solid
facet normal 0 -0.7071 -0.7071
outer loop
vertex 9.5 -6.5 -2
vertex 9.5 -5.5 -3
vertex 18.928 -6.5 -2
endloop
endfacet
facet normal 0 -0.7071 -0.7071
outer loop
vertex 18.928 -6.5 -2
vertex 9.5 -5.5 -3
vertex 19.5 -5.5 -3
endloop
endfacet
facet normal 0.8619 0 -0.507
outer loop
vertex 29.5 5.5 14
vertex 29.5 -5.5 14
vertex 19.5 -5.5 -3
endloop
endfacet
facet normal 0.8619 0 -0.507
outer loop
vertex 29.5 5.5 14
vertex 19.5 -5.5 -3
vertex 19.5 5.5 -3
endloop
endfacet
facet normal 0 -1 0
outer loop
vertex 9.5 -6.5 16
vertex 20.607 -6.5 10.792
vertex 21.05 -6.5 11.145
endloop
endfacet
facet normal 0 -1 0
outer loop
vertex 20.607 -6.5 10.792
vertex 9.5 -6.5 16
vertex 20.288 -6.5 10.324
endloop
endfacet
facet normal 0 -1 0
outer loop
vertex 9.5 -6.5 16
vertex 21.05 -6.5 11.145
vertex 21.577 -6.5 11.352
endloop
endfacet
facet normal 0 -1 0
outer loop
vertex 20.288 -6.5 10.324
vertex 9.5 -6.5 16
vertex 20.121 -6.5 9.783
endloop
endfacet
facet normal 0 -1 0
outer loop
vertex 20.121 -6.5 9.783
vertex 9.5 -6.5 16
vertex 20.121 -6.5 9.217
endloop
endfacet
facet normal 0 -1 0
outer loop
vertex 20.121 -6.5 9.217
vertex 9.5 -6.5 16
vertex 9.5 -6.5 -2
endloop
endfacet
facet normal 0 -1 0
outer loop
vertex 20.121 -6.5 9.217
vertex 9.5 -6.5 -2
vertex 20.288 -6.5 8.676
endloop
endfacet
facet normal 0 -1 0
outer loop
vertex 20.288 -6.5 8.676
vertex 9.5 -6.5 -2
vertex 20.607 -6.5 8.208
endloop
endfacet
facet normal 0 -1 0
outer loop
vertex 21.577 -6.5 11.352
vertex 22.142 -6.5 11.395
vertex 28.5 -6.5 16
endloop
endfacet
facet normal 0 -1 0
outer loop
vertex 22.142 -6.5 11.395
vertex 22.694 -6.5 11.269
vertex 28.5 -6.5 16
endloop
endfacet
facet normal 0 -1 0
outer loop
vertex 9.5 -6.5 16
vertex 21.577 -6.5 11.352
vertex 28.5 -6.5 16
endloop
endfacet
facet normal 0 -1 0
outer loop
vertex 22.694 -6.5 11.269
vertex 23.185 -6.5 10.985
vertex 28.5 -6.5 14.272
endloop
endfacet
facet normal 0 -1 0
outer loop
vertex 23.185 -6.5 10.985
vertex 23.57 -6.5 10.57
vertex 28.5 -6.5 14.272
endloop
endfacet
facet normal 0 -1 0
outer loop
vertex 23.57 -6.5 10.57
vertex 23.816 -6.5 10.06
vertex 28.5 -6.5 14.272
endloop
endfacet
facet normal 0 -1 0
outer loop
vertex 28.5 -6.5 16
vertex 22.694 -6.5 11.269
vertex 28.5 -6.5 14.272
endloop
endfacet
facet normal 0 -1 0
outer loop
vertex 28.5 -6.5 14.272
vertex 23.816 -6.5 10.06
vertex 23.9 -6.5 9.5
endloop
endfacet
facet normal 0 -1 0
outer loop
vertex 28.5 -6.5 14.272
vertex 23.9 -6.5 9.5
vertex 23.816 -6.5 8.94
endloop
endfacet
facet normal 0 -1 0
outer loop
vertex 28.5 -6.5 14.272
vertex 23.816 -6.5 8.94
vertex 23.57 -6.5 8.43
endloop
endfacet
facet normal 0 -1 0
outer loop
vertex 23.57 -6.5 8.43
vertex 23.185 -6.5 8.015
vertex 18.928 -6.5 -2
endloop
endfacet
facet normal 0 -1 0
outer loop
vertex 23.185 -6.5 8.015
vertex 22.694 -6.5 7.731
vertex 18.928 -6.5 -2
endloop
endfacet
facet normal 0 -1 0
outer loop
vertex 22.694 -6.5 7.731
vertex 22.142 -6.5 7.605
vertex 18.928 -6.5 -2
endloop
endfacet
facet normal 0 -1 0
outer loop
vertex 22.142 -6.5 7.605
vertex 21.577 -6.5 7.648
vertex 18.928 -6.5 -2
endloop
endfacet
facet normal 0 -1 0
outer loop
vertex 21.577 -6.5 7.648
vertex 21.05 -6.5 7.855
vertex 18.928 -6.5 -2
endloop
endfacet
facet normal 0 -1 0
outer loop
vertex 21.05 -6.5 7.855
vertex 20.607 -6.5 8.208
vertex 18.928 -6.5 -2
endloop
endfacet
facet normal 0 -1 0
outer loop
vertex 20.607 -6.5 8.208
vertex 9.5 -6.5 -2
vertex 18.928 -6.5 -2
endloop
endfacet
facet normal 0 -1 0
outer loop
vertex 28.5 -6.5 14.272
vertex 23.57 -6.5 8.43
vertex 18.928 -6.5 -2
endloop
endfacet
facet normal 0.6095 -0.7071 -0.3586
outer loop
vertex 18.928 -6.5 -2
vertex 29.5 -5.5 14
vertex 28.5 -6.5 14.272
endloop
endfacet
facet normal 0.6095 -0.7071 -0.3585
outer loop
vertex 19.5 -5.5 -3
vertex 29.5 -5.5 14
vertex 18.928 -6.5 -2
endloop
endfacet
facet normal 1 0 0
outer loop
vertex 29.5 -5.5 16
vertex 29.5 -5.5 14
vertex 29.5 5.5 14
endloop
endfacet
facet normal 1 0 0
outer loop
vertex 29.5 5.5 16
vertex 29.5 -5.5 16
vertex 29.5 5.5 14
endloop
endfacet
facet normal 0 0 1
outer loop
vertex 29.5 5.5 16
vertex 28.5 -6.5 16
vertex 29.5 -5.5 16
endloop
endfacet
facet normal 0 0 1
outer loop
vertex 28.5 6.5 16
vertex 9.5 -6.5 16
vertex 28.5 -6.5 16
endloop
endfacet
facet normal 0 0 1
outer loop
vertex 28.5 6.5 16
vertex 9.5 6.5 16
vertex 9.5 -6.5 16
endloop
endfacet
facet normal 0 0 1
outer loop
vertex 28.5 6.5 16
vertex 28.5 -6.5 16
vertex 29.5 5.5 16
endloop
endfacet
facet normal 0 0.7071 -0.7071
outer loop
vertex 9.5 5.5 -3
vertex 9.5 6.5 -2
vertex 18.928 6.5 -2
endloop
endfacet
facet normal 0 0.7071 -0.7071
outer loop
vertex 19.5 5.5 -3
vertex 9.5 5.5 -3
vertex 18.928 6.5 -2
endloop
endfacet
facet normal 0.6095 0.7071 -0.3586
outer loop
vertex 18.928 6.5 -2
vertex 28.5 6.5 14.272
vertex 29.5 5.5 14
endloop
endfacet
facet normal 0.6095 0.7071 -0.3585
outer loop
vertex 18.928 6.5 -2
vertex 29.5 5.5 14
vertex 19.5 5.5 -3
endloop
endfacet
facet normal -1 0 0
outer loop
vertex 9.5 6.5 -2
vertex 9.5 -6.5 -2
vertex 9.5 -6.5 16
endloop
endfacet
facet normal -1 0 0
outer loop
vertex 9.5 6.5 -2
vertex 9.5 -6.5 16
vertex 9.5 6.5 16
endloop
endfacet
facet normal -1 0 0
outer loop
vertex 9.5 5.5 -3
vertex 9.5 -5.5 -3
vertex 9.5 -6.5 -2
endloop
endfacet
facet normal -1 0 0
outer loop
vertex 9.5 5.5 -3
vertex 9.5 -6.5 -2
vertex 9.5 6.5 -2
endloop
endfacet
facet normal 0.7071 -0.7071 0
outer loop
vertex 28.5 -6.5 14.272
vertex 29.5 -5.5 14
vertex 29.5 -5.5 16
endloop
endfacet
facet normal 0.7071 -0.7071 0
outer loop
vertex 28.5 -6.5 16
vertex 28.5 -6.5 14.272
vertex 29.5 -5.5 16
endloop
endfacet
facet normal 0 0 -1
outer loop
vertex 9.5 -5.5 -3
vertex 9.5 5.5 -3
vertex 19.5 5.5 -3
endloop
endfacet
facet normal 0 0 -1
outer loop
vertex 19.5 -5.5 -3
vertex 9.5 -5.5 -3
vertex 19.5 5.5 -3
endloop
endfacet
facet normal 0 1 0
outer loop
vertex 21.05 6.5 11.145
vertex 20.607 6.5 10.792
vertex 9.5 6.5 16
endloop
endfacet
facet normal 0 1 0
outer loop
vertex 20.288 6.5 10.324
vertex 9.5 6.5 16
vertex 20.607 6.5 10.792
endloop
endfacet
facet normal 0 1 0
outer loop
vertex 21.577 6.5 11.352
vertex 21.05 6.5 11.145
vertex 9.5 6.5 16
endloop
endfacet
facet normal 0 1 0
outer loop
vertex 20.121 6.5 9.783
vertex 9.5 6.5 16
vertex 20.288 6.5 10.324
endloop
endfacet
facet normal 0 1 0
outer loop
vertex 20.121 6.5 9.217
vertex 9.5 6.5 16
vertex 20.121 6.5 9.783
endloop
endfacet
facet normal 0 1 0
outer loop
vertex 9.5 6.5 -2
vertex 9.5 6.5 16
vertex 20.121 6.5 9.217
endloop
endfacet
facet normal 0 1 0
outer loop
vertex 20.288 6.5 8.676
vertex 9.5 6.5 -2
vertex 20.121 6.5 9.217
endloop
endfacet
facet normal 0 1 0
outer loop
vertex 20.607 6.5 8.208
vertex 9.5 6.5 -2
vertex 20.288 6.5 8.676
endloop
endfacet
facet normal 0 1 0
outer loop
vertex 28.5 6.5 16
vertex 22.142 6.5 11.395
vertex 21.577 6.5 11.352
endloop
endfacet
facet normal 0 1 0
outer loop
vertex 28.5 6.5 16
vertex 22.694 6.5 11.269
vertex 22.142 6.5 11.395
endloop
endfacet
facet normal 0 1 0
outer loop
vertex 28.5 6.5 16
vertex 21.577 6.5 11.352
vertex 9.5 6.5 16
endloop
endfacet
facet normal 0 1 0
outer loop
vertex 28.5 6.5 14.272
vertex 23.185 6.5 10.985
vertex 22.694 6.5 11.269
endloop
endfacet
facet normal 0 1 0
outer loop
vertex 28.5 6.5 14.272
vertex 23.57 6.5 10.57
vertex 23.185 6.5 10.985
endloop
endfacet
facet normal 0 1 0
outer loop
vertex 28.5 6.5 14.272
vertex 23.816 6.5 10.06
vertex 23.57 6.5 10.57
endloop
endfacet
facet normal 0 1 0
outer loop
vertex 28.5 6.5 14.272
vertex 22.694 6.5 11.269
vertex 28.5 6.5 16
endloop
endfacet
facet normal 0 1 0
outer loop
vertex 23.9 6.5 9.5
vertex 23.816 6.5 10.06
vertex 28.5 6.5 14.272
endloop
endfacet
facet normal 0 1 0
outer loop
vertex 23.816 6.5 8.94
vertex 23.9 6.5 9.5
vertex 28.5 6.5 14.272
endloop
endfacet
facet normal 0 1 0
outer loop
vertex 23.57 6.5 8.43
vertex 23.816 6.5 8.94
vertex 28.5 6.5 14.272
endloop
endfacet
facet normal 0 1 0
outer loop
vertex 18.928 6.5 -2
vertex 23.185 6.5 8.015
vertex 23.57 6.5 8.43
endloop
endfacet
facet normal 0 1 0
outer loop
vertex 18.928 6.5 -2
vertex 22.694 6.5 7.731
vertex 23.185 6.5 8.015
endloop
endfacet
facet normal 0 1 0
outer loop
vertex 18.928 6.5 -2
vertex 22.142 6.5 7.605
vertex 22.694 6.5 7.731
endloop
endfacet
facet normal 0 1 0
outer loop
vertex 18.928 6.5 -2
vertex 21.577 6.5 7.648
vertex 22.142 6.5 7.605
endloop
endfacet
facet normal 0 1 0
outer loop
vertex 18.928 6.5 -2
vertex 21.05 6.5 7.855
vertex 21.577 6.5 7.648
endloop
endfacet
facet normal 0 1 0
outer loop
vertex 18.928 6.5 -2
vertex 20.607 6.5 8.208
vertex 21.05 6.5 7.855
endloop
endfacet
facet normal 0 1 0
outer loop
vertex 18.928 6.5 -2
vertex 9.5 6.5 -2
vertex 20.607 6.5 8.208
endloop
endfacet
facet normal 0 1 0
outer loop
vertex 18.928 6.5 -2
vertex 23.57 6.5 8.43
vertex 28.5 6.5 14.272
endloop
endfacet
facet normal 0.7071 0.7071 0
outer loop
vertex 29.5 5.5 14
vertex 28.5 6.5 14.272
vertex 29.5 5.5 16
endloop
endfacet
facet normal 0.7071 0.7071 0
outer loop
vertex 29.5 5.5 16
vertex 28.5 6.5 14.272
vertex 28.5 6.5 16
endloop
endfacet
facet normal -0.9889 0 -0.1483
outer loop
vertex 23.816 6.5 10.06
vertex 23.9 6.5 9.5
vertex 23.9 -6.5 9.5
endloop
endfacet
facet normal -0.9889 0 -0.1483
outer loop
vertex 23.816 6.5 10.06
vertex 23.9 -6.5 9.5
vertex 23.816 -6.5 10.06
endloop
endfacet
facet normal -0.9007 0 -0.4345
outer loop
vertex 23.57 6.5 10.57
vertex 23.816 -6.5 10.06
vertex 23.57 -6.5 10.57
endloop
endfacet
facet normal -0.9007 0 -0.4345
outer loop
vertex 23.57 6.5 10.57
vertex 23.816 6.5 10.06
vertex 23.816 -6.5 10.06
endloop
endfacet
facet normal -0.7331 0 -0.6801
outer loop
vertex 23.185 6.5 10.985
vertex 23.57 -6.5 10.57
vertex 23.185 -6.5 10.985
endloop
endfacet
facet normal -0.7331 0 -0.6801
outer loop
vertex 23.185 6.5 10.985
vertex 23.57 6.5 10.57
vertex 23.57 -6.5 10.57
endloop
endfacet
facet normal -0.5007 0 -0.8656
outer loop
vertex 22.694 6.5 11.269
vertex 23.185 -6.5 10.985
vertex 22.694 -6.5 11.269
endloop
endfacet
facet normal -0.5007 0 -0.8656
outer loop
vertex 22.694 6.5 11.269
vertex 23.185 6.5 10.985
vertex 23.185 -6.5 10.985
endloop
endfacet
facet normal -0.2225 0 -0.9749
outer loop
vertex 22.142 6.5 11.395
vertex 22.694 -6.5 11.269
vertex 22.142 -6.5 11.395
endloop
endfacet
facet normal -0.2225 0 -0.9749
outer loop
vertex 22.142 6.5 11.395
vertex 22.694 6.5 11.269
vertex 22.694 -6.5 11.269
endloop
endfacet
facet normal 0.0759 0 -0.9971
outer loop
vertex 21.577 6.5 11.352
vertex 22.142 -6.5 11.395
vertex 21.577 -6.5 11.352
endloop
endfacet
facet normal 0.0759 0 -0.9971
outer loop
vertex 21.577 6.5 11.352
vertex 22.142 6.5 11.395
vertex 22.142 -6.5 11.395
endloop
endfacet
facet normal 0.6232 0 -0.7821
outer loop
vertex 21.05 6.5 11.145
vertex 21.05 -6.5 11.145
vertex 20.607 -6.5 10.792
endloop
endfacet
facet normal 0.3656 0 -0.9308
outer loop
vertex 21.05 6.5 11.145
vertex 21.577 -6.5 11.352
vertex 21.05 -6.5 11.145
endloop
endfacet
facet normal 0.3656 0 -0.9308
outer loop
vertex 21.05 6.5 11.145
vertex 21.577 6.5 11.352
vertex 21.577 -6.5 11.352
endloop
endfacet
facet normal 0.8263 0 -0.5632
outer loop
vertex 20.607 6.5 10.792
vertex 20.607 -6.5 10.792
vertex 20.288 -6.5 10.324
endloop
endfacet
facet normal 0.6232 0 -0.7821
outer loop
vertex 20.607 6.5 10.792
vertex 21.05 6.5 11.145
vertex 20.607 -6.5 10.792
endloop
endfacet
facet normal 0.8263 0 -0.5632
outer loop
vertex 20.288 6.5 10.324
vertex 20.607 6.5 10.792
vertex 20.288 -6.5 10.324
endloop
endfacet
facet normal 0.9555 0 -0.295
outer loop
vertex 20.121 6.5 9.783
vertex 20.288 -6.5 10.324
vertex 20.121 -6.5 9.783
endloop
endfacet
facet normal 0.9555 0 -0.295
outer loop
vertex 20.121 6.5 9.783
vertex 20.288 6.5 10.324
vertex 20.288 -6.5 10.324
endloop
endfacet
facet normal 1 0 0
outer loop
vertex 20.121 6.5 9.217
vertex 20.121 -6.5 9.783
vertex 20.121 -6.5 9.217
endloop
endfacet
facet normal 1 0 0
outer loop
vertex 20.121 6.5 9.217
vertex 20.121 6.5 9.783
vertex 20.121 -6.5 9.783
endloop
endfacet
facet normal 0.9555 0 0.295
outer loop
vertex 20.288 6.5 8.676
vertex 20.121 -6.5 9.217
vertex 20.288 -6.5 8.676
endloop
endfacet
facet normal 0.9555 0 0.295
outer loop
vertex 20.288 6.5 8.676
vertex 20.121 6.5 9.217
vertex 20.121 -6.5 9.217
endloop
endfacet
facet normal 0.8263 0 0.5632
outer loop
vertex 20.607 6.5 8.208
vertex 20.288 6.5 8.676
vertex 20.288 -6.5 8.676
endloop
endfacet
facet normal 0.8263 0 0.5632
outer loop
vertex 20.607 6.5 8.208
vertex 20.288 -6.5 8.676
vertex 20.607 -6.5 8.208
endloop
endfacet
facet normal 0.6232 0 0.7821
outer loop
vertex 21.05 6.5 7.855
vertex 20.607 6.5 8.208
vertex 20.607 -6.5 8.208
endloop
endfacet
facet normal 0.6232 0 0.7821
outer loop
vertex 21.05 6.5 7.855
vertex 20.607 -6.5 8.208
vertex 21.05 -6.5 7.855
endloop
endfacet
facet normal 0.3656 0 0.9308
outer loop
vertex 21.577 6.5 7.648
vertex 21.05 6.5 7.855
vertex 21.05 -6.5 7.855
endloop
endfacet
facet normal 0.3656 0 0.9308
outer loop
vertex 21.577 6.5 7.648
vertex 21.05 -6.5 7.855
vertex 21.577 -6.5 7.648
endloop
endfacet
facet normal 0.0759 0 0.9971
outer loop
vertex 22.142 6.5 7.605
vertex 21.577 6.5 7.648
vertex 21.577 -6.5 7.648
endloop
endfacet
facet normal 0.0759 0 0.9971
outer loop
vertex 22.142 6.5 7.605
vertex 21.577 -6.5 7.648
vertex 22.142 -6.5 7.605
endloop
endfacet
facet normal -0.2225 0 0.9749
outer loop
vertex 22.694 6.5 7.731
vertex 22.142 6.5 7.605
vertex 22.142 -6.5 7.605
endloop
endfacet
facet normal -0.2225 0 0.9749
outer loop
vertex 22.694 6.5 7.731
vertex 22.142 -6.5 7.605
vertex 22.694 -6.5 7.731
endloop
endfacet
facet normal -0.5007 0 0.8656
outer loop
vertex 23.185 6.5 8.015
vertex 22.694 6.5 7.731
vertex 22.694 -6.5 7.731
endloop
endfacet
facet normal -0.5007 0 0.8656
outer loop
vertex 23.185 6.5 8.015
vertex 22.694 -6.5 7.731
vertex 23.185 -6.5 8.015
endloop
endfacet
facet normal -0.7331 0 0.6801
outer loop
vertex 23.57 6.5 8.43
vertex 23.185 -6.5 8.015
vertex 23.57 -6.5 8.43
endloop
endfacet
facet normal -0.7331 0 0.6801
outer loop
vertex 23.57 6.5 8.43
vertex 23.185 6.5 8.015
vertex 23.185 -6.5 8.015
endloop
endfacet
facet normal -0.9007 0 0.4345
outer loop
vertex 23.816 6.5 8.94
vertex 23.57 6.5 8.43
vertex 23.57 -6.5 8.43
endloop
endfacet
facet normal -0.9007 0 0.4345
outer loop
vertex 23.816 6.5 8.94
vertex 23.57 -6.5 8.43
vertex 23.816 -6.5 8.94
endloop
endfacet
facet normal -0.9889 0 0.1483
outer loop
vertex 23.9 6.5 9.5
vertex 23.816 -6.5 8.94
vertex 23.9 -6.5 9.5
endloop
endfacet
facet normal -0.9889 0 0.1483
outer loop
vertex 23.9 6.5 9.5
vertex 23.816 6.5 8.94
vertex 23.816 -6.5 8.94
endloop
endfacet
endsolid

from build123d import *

# Parameters (mm, degrees)
CYLINDER010_R                               = 1.9
CYLINDER010_DEPTH                           = 14
BOX015_W                                    = 20
BOX015_H                                    = 13
BOX015_DEPTH                                = 19
CHAMFER004013007011015006009007001002_SIZE2 = 10
CHAMFER004013007011015006009007001002_SIZE  = 17
CHAMFER004013007011015006009007001003_SIZE  = 1


with BuildPart() as cylinder010:
    # Cylinder010 → Cylinder010 (new body)
    with BuildSketch(Plane(origin=(22, 7, 9.5), x_dir=(1, 0, 0), z_dir=(0, -1, 0))):
        Circle(CYLINDER010_R)
    extrude(amount=CYLINDER010_DEPTH)


with BuildPart() as supporter:
    # Box015 → Box015 (new body)
    with BuildSketch(Plane(origin=(9.5, -6.5, -3), x_dir=(1, 0, 0), z_dir=(0, 0, 1))):
        with Locations((10, 6.5)):
            Rectangle(BOX015_W, BOX015_H)
    extrude(amount=BOX015_DEPTH)

    # Chamfer004013007011015006009007001002
    chamfer004013007011015006009007001002_edges = [supporter.edges().sort_by_distance(p)[0] for p in [
        (29.5, 0, -3),
    ]]
    chamfer004013007011015006009007001002_side = supporter.faces().sort_by_distance((29.5, 0, 6.5))[0]
    chamfer(chamfer004013007011015006009007001002_edges, length=CHAMFER004013007011015006009007001002_SIZE, length2=CHAMFER004013007011015006009007001002_SIZE2, reference=chamfer004013007011015006009007001002_side)

    # Chamfer004013007011015006009007001003
    chamfer004013007011015006009007001003_edges = [supporter.edges().sort_by_distance(p)[0] for p in [
        (29.5, -6.5, 15),
        (29.5, 6.5, 15),
        (14.5, -6.5, -3),
        (24.5, -6.5, 5.5),
        (24.5, 6.5, 5.5),
        (14.5, 6.5, -3),
    ]]
    chamfer(chamfer004013007011015006009007001003_edges, length=CHAMFER004013007011015006009007001003_SIZE)

    # Cut028006004005011004003001006: cut Cylinder010
    add(cylinder010.part, mode=Mode.SUBTRACT)


solid = supporter.part
